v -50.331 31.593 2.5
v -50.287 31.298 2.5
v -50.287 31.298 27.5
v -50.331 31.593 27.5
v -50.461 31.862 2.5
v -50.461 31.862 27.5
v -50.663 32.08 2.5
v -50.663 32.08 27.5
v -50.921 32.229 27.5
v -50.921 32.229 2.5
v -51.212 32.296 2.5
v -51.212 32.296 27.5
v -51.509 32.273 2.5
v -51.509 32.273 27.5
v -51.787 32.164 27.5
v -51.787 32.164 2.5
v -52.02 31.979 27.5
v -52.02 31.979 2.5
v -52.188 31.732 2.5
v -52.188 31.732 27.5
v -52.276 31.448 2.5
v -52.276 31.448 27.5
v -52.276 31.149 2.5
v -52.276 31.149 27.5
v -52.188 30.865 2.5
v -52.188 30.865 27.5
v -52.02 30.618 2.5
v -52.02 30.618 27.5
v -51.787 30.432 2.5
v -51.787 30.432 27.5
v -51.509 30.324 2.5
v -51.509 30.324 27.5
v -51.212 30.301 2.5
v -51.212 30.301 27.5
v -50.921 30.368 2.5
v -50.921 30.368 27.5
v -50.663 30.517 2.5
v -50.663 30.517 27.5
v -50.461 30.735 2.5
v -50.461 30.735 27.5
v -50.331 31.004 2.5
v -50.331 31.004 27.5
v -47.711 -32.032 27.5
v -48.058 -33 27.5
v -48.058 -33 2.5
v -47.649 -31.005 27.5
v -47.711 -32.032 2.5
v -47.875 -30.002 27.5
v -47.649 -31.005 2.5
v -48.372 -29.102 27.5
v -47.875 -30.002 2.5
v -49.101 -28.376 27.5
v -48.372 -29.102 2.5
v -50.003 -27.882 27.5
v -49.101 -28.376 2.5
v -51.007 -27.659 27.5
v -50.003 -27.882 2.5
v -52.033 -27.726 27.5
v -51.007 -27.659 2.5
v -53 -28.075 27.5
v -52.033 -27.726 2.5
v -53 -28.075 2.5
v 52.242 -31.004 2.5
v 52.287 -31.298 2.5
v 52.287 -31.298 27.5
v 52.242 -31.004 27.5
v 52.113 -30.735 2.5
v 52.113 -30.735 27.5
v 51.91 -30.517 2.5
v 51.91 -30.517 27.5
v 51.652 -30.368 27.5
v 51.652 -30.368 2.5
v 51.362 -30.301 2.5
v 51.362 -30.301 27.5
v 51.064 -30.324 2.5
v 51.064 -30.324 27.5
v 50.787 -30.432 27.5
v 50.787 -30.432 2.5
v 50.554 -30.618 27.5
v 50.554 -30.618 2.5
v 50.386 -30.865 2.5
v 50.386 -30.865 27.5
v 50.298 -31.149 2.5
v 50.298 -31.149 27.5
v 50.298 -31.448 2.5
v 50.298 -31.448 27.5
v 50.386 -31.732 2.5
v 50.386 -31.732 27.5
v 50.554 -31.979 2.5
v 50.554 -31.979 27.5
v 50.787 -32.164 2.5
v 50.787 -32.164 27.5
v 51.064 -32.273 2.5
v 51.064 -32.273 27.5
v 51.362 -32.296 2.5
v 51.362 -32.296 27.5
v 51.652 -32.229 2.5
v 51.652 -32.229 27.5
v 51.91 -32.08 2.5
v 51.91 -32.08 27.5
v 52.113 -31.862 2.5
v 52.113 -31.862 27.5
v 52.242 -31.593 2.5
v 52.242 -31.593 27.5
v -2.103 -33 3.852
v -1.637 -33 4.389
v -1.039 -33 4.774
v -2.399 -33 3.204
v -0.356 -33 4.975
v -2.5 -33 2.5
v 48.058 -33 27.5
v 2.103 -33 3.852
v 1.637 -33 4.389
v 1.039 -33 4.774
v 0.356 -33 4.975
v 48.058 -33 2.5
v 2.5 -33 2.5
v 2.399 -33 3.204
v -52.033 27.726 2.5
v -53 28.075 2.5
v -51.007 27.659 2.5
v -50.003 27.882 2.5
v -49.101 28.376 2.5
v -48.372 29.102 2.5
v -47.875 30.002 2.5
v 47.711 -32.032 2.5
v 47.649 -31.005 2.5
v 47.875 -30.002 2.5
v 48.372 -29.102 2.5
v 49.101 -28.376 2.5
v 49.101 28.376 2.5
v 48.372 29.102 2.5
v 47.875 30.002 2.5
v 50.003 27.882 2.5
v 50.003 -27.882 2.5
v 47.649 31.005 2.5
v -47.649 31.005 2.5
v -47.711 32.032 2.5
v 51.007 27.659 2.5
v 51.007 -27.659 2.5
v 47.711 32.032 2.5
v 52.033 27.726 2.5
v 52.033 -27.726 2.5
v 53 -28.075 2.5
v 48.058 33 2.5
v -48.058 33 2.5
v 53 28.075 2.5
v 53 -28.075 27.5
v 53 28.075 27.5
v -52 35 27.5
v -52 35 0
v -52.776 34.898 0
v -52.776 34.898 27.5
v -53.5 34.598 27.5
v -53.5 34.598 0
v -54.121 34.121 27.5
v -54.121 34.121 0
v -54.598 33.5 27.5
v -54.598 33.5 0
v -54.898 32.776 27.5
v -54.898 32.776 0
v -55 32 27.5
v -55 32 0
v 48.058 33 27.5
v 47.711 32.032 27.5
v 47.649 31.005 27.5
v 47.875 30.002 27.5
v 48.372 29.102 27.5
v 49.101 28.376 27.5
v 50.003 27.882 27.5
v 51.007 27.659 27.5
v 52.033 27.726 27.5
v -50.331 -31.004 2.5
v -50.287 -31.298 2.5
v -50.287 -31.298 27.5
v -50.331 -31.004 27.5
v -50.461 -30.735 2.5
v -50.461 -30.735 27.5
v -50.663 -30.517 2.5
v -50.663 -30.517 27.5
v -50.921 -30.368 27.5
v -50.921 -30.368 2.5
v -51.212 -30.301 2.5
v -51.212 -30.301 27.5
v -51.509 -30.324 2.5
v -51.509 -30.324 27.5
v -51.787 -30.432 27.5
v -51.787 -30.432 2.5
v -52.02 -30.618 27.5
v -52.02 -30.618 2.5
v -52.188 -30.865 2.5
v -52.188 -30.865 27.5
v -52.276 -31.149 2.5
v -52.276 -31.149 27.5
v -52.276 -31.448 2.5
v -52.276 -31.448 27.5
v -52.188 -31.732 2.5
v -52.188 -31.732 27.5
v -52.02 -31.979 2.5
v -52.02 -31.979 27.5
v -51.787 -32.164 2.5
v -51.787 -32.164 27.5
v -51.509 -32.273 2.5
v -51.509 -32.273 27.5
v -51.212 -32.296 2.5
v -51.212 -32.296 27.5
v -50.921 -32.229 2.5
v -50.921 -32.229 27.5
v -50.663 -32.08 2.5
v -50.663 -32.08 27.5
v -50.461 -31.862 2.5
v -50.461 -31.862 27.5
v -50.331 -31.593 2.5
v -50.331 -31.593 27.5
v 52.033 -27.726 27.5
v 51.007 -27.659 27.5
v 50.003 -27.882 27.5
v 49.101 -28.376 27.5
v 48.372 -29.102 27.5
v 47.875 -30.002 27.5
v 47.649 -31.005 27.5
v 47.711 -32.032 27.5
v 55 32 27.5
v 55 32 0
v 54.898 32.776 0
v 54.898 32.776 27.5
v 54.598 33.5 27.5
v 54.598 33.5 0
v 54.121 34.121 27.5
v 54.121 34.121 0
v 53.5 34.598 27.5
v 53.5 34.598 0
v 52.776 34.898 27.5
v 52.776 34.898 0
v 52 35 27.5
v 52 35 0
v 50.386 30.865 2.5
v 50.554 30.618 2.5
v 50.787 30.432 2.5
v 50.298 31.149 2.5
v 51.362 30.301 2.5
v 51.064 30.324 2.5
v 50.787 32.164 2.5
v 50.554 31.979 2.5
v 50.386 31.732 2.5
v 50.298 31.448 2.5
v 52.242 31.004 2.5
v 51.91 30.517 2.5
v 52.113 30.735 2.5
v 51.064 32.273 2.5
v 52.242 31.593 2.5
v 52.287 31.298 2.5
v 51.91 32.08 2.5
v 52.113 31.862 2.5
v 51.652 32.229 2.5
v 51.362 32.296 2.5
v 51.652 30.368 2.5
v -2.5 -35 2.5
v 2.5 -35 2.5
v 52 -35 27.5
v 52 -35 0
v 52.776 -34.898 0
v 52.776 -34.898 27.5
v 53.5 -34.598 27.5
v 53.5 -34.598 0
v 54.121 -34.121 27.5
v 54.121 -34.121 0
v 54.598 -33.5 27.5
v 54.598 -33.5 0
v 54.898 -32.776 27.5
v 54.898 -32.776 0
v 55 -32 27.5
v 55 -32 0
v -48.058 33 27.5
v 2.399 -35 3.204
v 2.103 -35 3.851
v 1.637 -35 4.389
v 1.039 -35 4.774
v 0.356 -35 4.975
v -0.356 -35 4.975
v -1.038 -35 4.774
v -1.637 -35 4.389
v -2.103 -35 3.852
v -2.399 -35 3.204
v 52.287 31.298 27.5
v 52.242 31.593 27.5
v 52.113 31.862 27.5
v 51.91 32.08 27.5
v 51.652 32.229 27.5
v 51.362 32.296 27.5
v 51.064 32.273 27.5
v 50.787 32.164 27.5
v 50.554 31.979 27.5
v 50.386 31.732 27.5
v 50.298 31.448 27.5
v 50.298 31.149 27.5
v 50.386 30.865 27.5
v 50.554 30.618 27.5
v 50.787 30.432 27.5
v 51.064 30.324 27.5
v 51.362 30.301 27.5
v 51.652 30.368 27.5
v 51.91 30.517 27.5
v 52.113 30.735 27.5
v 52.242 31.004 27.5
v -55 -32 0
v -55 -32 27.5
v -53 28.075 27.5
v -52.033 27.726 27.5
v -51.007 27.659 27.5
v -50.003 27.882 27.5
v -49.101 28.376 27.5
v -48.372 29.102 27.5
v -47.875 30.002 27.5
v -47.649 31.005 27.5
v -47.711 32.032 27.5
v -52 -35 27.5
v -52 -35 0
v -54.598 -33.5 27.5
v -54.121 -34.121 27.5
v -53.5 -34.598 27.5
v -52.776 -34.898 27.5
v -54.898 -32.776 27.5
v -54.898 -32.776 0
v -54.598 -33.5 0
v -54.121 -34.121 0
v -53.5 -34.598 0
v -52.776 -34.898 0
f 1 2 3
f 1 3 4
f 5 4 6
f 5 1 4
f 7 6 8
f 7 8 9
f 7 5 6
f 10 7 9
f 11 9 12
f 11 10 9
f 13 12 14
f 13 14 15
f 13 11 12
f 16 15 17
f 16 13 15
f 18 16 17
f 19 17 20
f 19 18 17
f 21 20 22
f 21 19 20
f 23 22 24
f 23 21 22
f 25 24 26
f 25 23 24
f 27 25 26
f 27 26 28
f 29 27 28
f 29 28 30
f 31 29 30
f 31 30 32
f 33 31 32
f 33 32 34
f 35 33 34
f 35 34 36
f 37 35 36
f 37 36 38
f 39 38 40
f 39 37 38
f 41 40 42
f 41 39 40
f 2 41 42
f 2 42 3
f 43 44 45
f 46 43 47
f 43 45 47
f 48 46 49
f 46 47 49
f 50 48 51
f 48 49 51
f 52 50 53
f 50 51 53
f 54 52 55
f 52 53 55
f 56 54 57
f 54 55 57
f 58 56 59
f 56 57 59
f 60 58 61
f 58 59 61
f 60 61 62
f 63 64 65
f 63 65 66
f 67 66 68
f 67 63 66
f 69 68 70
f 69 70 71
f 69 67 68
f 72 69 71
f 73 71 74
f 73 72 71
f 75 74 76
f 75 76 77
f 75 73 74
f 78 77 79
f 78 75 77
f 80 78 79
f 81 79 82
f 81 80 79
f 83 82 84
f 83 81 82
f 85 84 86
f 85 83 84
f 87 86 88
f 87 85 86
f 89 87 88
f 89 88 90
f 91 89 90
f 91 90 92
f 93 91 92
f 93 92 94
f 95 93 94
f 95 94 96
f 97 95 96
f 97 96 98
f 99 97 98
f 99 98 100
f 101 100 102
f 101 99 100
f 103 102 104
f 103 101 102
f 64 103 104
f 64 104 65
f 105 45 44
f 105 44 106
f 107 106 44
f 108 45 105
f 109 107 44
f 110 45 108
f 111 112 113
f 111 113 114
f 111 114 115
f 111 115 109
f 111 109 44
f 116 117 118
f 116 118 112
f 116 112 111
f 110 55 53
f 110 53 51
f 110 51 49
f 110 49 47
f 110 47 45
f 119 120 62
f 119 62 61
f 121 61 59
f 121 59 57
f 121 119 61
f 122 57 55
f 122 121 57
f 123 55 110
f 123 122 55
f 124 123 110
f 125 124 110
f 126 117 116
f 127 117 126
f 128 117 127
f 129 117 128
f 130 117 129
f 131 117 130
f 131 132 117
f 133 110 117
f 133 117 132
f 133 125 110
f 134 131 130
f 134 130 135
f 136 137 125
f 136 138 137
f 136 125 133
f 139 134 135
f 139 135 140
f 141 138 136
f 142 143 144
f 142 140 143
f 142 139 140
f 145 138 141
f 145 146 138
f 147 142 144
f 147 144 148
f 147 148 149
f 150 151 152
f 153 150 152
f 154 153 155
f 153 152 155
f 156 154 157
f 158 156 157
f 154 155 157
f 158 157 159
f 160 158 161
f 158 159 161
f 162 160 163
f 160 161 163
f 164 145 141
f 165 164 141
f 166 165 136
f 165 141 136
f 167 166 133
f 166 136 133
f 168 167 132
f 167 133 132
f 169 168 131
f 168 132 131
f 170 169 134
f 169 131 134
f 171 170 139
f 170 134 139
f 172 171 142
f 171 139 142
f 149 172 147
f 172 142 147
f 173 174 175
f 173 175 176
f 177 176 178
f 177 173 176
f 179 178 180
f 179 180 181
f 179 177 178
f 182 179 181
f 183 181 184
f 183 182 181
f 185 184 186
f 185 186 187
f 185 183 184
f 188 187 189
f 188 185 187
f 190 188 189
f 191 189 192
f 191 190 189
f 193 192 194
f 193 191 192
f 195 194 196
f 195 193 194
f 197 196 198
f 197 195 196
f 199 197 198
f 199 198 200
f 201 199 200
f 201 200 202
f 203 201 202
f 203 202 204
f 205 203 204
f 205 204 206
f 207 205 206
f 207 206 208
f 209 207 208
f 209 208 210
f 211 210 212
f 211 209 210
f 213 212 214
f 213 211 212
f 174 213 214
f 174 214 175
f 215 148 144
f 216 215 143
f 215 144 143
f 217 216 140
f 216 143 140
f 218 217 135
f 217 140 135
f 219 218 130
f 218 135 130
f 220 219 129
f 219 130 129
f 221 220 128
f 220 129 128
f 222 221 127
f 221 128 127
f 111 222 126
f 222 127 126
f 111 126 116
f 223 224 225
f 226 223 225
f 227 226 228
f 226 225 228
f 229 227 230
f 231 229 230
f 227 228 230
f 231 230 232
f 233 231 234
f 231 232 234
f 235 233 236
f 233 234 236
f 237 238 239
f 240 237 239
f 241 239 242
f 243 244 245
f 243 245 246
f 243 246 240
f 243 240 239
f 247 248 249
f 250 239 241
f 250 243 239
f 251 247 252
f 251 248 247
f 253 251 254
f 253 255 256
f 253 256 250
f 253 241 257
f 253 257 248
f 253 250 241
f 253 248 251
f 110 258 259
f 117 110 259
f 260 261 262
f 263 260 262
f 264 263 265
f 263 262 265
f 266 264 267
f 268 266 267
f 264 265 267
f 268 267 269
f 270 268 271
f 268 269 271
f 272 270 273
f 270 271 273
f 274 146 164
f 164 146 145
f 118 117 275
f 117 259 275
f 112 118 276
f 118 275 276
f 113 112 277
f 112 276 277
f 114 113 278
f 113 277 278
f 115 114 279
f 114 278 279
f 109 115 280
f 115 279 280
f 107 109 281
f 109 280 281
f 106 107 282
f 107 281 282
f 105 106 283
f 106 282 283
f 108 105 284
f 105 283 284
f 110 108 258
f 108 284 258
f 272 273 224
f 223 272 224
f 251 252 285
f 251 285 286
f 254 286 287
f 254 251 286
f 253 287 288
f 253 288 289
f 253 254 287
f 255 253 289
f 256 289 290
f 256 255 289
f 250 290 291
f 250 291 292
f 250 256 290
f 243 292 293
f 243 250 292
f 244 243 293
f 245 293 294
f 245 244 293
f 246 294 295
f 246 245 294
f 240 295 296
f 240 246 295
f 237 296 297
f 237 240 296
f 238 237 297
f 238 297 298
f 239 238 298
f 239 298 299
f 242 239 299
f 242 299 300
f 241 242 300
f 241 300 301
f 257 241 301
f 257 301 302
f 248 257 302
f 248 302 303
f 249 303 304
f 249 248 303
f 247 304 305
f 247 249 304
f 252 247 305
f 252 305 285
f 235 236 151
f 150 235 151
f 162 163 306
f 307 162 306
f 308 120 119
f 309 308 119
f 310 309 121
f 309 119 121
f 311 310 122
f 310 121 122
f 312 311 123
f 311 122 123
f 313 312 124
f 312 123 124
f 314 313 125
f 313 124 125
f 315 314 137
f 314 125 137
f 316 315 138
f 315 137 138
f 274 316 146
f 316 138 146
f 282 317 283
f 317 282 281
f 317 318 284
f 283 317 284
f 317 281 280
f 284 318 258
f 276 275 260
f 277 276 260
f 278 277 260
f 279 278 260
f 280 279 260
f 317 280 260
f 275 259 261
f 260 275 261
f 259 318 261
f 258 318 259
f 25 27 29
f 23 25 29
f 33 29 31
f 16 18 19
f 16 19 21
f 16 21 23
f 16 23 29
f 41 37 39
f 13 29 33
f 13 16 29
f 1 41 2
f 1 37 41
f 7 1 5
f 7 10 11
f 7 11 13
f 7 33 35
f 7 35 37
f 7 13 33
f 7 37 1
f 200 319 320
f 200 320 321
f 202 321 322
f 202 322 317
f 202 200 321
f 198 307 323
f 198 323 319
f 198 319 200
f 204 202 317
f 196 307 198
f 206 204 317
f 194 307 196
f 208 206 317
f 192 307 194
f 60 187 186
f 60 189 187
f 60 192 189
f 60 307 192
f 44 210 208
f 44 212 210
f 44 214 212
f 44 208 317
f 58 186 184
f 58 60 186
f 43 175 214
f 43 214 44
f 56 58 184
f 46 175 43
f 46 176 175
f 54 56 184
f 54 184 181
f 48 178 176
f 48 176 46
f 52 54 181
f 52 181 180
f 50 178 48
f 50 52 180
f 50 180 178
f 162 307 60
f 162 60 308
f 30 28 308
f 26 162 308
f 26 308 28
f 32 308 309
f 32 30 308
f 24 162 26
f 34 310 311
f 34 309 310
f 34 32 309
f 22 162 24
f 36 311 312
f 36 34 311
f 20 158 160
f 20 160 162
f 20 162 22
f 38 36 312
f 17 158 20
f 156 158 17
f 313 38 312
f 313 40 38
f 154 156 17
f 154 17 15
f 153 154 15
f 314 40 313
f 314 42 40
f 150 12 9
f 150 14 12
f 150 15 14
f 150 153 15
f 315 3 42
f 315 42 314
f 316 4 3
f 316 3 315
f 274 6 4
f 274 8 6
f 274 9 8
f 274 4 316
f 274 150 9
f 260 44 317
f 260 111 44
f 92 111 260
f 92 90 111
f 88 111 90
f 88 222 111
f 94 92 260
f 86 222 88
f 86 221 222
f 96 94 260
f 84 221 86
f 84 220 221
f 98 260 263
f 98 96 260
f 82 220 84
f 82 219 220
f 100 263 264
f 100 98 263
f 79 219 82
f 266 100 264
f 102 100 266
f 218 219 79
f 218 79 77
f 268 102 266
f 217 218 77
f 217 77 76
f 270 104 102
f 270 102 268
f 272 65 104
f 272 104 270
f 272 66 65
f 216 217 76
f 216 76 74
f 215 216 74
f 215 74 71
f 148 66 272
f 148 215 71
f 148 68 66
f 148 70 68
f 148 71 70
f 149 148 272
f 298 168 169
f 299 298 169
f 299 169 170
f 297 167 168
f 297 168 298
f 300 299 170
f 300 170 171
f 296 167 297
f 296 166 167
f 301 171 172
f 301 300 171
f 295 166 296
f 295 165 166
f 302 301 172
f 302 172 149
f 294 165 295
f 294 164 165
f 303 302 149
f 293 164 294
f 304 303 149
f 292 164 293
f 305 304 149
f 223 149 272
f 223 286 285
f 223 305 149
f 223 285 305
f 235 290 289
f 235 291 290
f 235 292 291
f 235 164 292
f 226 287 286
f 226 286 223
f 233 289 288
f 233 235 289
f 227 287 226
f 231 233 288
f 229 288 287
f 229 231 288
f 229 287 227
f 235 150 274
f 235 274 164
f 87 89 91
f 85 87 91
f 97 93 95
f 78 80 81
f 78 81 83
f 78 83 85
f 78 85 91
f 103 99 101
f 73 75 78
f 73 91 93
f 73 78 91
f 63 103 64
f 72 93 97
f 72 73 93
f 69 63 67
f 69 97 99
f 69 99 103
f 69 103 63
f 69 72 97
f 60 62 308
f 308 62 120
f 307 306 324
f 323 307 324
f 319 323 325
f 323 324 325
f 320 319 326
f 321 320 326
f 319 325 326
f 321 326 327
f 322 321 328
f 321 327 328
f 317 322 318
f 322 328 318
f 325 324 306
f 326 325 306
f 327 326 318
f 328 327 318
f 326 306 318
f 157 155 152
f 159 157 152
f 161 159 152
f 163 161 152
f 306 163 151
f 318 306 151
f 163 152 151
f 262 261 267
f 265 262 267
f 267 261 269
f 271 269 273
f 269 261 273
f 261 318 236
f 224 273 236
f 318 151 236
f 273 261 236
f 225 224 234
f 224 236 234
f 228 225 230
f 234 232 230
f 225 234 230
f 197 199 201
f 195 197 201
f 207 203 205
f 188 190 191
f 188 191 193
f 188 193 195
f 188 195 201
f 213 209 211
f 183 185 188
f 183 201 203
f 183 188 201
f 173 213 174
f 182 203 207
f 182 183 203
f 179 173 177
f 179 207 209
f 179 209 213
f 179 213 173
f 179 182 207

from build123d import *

# Parameters (mm, degrees)
F0_W     = 106
F0_H     = 66
F1_DEPTH = 2.5
F2_DEPTH = 27.5
F3_R     = 3.65
F3_R_2   = 1
F4_DEPTH = 25
F7_DEPTH = 2


with BuildPart() as f1:
    # F0 (on Top) → F1 (new body)
    with BuildSketch(Plane.XY):
        with BuildLine():
            ThreePointArc((55, 32), (54.12132, 34.12132), (52, 35))
            Line((52, 35), (-52, 35))
            ThreePointArc((-52, 35), (-54.12132, 34.12132), (-55, 32))
            Line((-55, 32), (-55, -32))
            ThreePointArc((-55, -32), (-54.12132, -34.12132), (-52, -35))
            Line((-52, -35), (52, -35))
            ThreePointArc((52, -35), (54.12132, -34.12132), (55, -32))
            Line((55, -32), (55, 32))
        make_face()
        Rectangle(F0_W, F0_H, mode=Mode.SUBTRACT)
        Rectangle(F0_W, F0_H)
    extrude(amount=F1_DEPTH)

    # F0 (on Top) → F2 (join)
    with BuildSketch(Plane.XY):
        with BuildLine():
            ThreePointArc((55, 32), (54.12132, 34.12132), (52, 35))
            Line((52, 35), (-52, 35))
            ThreePointArc((-52, 35), (-54.12132, 34.12132), (-55, 32))
            Line((-55, 32), (-55, -32))
            ThreePointArc((-55, -32), (-54.12132, -34.12132), (-52, -35))
            Line((-52, -35), (52, -35))
            ThreePointArc((52, -35), (54.12132, -34.12132), (55, -32))
            Line((55, -32), (55, 32))
        make_face()
        Rectangle(F0_W, F0_H, mode=Mode.SUBTRACT)
    extrude(amount=F2_DEPTH)

    # F3 (on face) → F4 (join)
    with BuildSketch(Plane.XY.offset(2.5)):
        with Locations((-51.286835, 31.298466)):
            Circle(F3_R)
        with Locations((-51.286835, 31.298466)):
            Circle(F3_R_2, mode=Mode.SUBTRACT)
        with Locations((-51.286835, -31.298466)):
            Circle(F3_R)
        with Locations((-51.286835, -31.298466)):
            Circle(F3_R_2, mode=Mode.SUBTRACT)
        with Locations((51.286835, -31.298466)):
            Circle(F3_R)
        with Locations((51.286835, -31.298466)):
            Circle(F3_R_2, mode=Mode.SUBTRACT)
        with Locations((51.286835, 31.298466)):
            Circle(F3_R)
        with Locations((51.286835, 31.298466)):
            Circle(F3_R_2, mode=Mode.SUBTRACT)
    extrude(amount=F4_DEPTH)

    # F6 (on offset) → F7 (cut, through all)
    with BuildSketch(Plane.XZ.offset(35)):
        with BuildLine():
            Line((-2.5, 2.5), (2.5, 2.499828))
            ThreePointArc((2.5, 2.499828), (8.6e-05, 5), (-2.5, 2.5))
        make_face()
    extrude(amount=-F7_DEPTH, mode=Mode.SUBTRACT)


solid = f1.part
